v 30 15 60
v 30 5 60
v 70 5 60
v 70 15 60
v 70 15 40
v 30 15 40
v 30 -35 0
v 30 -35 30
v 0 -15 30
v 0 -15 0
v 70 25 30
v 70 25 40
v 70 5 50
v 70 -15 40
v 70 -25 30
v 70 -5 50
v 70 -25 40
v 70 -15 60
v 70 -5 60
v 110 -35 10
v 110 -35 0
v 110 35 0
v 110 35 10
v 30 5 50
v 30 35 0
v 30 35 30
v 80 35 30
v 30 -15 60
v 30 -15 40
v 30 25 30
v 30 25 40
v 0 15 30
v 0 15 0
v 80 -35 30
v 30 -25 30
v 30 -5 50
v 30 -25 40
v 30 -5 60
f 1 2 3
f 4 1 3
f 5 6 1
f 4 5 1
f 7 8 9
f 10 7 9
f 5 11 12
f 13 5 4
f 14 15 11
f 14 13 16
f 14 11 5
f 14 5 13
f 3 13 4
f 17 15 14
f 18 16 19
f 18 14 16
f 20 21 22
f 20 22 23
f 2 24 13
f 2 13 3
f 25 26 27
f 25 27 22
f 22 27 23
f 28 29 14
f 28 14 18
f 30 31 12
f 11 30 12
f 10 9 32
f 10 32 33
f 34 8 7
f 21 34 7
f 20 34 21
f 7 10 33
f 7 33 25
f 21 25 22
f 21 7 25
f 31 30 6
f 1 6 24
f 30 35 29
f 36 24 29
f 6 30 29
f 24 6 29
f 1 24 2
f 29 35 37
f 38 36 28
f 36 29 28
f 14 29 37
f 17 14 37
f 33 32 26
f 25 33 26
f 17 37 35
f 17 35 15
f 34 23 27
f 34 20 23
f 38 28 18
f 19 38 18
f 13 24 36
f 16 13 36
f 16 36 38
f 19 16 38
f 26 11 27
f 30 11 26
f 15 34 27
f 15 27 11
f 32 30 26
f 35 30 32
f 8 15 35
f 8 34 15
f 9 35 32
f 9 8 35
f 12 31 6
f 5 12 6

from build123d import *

# Parameters (mm, degrees)
F1_DEPTH = 35
F0_W     = 40
F0_H     = 30
F2_DEPTH = 25
F4_DEPTH = 30.001
F5_W     = 10
F5_H     = 20
F6_DEPTH = 80.001
F7_W     = 10
F7_H     = 10
F8_DEPTH = 80.001


with BuildPart() as f1:
    # F0 (on Front) → F1 (new body, symmetric)
    with BuildSketch(Plane.XZ):
        Polygon((0, 30), (0, 0), (110, 0), (110, 10), (80, 30), (70, 30), (30, 30), align=None)
    extrude(amount=F1_DEPTH, both=True)

    # F0 (on Front) → F2 (join, symmetric)
    with BuildSketch(Plane.XZ):
        with Locations((50, 45)):
            Rectangle(F0_W, F0_H)
    extrude(amount=F2_DEPTH, both=True)

    # F3 (on face) → F4 (cut, through all)
    with BuildSketch(Plane.XY.offset(30)):
        Polygon((0, -35), (30, -35), (0, -15), align=None)
        Polygon((0, 15), (30, 35), (0, 35), align=None)
    extrude(amount=-F4_DEPTH, mode=Mode.SUBTRACT)

    # F5 (on face) → F6 (cut, through all)
    with BuildSketch(Plane(origin=(30, 0, 0), x_dir=(0, -1, 0), z_dir=(-1, 0, 0))):
        with Locations((-20, 50)):
            Rectangle(F5_W, F5_H)
        with Locations((20, 50)):
            Rectangle(F5_W, F5_H)
    extrude(amount=-F6_DEPTH, mode=Mode.SUBTRACT)

    # F7 (on face) → F8 (cut, through all)
    with BuildSketch(Plane(origin=(30, 0, 0), x_dir=(0, -1, 0), z_dir=(-1, 0, 0))):
        with Locations((0, 55)):
            Rectangle(F7_W, F7_H)
    extrude(amount=-F8_DEPTH, mode=Mode.SUBTRACT)


solid = f1.part
